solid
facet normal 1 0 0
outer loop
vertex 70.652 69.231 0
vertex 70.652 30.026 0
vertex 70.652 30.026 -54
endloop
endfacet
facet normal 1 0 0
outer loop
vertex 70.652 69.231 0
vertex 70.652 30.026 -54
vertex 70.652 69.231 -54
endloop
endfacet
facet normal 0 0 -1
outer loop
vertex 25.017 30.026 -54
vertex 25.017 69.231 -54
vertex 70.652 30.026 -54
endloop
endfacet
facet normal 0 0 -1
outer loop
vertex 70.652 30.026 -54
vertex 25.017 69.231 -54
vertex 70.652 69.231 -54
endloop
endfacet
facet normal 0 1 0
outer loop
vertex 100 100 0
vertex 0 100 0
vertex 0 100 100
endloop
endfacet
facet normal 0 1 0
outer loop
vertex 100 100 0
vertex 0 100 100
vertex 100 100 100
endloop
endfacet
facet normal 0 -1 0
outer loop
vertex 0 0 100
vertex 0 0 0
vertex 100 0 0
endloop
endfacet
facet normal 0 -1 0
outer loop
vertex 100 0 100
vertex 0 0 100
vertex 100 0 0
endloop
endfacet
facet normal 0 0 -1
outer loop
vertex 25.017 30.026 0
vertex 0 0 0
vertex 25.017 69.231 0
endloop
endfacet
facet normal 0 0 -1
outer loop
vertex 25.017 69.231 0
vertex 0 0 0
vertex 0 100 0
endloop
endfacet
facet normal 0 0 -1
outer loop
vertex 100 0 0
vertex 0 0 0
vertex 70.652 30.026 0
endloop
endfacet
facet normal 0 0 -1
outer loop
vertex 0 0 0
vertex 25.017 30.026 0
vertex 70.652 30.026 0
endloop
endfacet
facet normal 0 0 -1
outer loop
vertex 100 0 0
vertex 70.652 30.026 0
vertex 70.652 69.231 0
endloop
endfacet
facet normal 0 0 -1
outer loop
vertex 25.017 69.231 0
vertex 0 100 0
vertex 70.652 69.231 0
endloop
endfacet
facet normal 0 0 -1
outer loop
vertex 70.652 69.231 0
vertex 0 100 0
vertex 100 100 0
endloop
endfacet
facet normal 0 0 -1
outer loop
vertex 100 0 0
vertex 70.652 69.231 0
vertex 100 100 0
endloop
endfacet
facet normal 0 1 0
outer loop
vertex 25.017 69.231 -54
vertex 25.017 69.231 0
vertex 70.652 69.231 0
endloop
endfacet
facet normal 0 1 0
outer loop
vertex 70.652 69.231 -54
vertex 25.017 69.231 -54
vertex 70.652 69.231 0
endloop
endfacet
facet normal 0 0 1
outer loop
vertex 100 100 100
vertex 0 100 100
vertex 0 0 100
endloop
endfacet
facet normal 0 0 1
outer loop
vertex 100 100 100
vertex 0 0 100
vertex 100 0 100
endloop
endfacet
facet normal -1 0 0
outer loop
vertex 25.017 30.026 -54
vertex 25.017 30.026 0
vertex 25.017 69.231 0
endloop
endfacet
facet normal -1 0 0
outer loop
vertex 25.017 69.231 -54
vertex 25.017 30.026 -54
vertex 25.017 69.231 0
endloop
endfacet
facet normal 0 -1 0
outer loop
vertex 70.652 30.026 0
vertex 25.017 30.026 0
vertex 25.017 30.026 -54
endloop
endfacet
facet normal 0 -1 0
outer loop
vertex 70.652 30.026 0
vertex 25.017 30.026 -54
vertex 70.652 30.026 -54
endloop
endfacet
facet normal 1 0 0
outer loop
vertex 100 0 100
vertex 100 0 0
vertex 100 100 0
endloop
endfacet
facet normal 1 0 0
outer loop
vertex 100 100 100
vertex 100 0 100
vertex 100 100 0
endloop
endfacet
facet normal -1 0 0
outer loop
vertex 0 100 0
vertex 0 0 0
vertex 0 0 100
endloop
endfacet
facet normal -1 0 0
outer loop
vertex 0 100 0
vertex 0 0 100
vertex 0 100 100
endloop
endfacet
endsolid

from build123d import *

# Parameters (mm, degrees)
F0_W     = 100
F0_H     = 100
F1_DEPTH = 100
F2_W     = 45.6354245543
F2_H     = 39.2044447362
F3_DEPTH = 154


# Not quite as in the source:
# - a feature names something its author has since deleted; it is built from what else it names


with BuildPart() as f1:
    # F0 (on Top) → F1 (new body)
    with BuildSketch(Plane.XY):
        with Locations((50, 50)):
            Rectangle(F0_W, F0_H)
    extrude(amount=F1_DEPTH)

    # F2 (on face) → F3 (join)
    with BuildSketch(Plane.XY.offset(100)):
        with Locations((47.8344149888, 49.6286619455)):
            Rectangle(F2_W, F2_H)
    extrude(amount=-F3_DEPTH)


solid = f1.part
